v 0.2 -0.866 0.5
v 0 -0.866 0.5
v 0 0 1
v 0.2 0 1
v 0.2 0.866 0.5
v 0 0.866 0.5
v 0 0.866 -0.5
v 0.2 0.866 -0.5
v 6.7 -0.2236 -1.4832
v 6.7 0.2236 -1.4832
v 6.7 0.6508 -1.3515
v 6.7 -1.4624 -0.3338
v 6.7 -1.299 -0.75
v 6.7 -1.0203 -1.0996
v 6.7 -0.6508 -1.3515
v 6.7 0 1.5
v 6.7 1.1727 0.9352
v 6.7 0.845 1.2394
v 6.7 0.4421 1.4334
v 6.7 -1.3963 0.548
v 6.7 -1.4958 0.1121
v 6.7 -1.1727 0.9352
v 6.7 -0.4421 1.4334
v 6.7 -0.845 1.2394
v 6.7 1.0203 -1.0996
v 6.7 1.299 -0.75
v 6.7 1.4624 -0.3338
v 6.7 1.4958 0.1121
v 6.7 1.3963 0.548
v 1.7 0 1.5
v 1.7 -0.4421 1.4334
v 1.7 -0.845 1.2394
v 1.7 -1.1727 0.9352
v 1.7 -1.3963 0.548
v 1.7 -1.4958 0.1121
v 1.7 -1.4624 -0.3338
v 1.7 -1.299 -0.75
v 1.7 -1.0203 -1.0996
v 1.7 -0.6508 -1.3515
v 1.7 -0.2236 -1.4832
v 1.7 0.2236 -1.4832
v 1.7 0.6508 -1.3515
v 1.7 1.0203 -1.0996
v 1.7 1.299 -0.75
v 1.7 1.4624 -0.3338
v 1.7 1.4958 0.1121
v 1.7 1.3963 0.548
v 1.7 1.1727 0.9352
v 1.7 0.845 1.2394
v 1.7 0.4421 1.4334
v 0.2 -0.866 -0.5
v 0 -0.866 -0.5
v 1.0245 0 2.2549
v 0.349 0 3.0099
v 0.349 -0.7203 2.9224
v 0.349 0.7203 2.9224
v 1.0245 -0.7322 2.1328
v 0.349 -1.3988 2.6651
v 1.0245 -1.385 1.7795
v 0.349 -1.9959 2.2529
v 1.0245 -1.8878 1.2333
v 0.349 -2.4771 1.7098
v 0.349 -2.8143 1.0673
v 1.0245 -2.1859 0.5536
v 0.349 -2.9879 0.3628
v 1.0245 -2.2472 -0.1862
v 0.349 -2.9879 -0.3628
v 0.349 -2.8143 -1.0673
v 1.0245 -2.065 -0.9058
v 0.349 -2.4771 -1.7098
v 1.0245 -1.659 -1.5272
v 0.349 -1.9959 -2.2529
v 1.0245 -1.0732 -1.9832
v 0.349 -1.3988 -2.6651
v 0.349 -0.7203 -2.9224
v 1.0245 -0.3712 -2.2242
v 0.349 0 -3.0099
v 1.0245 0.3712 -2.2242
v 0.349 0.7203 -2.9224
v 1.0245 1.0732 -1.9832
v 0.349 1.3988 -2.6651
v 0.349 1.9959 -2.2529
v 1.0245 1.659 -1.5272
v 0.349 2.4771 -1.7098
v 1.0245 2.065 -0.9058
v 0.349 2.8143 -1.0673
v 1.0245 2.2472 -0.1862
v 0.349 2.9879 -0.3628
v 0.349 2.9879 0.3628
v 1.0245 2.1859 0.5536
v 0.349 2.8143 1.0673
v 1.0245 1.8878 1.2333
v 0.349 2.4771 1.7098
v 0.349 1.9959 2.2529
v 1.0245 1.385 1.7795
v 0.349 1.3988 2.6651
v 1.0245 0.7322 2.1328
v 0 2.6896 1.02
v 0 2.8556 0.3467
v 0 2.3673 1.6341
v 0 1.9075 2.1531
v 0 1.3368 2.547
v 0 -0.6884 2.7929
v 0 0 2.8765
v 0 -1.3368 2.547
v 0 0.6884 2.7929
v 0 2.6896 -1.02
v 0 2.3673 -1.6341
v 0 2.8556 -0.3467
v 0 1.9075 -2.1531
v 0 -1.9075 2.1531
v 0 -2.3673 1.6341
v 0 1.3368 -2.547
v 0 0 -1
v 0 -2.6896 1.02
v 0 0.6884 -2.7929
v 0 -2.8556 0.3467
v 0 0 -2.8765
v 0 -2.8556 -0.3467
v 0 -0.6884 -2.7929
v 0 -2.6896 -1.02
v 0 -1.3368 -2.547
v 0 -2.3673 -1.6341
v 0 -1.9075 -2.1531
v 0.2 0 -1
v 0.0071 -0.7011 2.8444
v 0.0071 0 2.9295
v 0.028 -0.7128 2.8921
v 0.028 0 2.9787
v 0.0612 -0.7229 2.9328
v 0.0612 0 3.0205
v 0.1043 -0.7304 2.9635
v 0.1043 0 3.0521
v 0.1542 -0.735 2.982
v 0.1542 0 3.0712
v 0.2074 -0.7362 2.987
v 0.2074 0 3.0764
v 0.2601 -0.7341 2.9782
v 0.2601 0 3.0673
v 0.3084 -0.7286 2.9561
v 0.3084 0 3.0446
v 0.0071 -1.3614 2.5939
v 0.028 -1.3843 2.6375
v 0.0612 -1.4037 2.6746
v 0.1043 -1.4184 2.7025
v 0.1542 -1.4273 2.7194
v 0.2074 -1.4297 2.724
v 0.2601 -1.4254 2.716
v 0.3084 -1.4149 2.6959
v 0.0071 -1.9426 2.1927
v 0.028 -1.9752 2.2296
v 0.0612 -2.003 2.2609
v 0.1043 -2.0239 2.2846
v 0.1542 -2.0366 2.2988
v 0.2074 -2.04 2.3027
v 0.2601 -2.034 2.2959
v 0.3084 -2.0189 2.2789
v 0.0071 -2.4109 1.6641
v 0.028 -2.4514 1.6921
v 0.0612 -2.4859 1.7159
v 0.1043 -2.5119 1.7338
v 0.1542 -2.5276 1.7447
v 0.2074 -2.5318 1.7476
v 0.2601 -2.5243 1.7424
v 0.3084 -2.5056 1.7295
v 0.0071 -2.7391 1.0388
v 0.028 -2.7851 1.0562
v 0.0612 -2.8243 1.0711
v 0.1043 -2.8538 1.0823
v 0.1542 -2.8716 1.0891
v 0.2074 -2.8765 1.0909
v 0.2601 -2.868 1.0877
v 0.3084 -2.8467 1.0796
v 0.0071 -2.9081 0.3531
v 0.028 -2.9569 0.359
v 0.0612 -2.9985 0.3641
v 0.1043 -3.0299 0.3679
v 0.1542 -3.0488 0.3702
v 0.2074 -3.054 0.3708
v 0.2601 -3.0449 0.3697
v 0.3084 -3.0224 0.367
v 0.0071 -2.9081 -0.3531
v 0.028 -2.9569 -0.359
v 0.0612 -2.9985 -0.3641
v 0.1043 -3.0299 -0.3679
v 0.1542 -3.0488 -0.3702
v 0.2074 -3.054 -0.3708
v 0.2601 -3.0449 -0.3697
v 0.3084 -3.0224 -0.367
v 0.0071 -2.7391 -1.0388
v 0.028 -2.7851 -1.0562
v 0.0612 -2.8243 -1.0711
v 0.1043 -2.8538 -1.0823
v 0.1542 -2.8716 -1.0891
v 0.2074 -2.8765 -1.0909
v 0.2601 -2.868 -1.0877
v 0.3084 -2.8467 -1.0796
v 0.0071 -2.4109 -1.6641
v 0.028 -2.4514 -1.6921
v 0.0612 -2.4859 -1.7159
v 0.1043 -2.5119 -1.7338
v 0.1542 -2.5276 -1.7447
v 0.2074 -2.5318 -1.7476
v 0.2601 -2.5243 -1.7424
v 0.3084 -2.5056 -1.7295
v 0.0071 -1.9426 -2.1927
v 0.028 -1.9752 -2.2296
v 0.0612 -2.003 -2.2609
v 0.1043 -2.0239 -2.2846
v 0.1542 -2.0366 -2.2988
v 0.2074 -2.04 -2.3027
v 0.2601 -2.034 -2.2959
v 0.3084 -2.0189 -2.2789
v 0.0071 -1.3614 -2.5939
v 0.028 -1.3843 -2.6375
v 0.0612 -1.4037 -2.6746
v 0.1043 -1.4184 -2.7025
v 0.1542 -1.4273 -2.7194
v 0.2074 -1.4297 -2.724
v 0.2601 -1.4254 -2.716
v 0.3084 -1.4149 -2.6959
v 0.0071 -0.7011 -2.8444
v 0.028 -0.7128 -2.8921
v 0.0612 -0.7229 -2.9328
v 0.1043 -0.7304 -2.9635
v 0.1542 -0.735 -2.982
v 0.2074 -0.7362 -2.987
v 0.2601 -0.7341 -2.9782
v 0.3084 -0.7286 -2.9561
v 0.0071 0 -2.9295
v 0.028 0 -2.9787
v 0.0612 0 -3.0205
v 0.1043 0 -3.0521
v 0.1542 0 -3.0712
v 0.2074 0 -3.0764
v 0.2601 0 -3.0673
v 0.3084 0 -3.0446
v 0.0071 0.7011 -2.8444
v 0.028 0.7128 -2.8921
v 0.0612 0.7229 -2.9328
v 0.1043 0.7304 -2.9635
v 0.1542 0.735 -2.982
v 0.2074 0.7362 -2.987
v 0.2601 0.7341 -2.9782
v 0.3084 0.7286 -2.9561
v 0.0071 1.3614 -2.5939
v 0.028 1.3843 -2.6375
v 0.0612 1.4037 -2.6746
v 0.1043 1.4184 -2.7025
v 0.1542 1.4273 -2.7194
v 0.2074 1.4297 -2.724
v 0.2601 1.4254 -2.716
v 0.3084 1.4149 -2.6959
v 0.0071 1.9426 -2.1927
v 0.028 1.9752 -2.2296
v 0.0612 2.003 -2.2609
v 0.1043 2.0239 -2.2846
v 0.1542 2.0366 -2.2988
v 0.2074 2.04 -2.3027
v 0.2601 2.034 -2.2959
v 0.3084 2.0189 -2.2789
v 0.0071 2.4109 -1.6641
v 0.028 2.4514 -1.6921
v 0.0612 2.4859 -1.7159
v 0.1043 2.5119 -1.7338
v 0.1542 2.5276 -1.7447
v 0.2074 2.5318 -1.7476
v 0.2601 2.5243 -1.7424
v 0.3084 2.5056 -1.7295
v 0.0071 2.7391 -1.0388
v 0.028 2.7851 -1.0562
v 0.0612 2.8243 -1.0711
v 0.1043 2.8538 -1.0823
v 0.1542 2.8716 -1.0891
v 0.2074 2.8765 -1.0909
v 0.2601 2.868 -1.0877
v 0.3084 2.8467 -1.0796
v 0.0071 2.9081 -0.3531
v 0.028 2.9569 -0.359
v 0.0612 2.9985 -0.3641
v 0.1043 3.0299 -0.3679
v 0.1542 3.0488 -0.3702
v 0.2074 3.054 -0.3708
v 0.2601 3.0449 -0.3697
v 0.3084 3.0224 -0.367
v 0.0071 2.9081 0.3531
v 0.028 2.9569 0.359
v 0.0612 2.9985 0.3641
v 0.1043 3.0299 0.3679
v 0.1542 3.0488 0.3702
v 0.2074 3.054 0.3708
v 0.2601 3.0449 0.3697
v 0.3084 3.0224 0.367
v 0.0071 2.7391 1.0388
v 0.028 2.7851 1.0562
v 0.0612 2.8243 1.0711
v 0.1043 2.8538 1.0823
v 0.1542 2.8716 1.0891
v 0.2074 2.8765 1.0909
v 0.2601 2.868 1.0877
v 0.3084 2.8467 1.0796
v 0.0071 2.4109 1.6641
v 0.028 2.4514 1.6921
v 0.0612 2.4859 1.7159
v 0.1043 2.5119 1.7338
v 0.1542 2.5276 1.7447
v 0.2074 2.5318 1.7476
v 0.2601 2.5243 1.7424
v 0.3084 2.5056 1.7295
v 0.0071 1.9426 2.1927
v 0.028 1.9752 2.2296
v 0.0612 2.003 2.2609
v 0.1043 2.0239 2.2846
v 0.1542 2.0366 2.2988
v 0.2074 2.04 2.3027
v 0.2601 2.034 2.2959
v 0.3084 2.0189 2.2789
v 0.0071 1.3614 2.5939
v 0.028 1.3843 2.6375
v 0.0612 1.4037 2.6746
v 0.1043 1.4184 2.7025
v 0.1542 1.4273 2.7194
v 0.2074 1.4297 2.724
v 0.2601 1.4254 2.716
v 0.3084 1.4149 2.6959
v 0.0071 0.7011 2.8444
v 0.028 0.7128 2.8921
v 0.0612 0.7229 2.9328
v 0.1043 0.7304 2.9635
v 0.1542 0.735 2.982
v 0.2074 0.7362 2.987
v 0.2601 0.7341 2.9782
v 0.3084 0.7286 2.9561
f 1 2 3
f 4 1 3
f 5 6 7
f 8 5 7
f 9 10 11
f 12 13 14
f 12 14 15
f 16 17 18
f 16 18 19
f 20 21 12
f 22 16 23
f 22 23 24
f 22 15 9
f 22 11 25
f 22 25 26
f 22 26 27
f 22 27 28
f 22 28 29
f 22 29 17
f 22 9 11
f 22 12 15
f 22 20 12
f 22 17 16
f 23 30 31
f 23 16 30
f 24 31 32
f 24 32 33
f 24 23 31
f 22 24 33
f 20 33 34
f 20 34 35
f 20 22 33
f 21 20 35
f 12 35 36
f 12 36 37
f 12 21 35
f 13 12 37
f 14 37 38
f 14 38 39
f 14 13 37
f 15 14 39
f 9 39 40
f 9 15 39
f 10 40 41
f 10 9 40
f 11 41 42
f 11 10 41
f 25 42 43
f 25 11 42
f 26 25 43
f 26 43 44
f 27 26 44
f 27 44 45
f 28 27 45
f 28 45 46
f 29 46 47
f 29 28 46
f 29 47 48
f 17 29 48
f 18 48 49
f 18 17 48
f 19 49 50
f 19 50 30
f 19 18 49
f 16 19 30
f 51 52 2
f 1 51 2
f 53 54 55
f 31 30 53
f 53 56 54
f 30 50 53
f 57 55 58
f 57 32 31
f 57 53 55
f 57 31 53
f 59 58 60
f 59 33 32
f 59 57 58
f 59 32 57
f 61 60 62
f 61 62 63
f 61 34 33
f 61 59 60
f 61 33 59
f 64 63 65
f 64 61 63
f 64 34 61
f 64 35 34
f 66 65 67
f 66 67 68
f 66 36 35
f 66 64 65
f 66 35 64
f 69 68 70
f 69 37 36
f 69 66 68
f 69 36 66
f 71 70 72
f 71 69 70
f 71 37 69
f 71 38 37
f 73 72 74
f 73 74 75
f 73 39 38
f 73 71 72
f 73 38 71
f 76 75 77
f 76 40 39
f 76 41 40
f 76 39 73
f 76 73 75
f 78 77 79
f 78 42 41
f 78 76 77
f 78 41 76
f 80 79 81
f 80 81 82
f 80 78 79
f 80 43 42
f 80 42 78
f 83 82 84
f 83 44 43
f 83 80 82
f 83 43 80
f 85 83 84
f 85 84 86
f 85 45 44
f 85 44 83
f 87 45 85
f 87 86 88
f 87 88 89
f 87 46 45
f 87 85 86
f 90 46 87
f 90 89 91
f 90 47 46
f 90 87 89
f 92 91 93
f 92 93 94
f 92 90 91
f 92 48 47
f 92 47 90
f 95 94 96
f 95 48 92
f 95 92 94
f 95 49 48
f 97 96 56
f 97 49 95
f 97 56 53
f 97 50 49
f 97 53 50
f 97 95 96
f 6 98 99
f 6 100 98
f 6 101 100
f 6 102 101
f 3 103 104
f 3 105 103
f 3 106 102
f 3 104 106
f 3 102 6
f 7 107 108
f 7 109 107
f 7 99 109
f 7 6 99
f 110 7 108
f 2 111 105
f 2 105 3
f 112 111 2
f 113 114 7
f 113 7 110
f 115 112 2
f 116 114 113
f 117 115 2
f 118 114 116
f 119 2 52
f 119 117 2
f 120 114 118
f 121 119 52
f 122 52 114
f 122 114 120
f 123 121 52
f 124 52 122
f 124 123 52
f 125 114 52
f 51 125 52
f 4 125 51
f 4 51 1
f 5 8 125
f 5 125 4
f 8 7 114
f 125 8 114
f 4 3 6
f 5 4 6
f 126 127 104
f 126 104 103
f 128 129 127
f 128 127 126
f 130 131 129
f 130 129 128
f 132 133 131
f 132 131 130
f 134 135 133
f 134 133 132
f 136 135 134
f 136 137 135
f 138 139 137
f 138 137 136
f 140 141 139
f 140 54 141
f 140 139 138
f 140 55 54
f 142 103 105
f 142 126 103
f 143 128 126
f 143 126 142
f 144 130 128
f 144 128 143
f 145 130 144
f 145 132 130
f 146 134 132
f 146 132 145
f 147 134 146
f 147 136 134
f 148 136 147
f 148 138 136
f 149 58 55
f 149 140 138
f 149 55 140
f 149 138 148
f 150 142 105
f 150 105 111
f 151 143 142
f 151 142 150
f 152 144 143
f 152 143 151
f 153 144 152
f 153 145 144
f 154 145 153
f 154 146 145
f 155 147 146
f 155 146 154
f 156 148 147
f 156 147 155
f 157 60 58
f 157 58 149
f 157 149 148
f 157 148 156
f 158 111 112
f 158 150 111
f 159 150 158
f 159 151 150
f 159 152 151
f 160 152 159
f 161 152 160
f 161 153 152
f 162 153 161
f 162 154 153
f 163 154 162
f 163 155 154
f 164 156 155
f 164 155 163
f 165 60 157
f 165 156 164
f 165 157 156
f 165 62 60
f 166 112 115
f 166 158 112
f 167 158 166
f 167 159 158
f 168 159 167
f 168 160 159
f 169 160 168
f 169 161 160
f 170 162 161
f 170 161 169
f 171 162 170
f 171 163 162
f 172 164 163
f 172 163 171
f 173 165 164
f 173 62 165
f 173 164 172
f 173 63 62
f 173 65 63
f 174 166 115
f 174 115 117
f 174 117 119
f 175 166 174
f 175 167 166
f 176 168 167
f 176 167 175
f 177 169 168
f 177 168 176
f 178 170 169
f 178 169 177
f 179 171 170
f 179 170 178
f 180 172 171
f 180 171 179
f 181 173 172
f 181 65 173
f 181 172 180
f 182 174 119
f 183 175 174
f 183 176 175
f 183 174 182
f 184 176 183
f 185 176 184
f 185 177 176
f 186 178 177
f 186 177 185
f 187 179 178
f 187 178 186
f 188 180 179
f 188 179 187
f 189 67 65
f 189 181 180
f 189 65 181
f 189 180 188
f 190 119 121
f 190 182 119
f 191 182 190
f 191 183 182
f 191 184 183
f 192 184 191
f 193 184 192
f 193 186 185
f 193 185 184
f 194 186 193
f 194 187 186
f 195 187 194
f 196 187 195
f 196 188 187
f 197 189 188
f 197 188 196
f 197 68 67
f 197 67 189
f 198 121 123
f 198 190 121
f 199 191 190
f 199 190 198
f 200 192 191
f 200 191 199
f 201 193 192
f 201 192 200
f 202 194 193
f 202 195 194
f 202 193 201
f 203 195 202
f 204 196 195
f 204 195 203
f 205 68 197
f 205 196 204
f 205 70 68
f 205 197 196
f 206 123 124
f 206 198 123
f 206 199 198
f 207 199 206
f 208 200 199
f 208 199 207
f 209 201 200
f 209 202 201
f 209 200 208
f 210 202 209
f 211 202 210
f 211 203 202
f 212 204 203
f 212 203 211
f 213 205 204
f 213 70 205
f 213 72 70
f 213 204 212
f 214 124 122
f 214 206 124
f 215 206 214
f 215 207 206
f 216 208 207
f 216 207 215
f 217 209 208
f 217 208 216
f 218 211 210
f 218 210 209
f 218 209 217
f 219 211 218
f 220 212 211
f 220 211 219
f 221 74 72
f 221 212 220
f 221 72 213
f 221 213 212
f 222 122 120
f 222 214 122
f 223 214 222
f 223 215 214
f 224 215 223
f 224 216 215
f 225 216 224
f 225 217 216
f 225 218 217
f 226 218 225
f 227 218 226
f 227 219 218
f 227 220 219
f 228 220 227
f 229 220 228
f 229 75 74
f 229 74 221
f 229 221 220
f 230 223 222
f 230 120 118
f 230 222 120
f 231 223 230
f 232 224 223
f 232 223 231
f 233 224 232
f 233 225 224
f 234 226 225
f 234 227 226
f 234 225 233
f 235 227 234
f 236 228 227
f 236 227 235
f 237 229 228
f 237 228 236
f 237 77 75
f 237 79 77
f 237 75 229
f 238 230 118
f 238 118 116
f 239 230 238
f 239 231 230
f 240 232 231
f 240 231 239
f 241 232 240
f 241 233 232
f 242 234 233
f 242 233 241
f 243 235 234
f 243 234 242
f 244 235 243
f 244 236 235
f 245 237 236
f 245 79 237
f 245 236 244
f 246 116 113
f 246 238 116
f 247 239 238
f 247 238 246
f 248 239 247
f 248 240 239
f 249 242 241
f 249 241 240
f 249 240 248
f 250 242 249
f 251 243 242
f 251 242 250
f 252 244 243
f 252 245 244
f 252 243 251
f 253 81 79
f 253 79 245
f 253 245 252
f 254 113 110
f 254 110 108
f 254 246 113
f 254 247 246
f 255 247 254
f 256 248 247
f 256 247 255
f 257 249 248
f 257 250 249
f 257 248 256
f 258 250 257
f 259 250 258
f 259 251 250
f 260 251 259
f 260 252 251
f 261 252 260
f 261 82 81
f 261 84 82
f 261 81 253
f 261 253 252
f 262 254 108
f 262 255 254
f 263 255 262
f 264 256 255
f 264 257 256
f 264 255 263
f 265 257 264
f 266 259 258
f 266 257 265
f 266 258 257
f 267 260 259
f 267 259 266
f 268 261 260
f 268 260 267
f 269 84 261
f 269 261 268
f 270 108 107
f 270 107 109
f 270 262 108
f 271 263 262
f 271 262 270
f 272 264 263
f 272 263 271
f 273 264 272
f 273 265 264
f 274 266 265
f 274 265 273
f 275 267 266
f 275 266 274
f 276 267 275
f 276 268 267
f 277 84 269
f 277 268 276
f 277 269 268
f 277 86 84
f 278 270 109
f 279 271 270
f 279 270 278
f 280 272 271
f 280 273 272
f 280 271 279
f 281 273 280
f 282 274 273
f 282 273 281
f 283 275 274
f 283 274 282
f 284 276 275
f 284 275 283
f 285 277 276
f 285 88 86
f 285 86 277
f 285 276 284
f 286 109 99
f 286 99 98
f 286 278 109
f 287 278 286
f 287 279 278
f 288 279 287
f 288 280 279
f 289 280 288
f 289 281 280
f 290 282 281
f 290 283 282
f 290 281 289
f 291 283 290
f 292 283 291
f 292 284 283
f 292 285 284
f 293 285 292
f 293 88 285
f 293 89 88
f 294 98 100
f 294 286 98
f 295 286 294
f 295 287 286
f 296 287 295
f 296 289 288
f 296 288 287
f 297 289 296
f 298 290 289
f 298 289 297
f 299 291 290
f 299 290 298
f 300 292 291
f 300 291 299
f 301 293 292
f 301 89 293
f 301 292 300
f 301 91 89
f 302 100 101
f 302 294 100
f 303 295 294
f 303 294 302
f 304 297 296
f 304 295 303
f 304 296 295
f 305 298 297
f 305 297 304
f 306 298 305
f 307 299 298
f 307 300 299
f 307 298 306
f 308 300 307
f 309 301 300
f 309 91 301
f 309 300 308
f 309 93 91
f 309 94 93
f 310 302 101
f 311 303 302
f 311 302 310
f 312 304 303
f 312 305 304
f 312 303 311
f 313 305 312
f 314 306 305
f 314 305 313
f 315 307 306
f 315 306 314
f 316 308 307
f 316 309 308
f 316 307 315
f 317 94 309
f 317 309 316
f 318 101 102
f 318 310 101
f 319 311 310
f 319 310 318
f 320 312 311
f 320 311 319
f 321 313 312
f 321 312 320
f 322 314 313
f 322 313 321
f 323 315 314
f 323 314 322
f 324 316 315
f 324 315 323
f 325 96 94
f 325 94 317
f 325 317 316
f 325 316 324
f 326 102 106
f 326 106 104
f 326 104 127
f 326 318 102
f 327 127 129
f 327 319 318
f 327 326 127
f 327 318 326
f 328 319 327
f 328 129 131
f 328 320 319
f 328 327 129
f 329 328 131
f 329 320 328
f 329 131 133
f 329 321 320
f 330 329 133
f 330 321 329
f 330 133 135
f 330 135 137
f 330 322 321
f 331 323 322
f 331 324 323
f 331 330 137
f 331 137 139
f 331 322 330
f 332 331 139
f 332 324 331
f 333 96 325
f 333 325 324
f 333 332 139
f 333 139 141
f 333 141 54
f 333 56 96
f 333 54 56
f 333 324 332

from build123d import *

# Parameters (mm, degrees)
CONG_1_R                = 0.2
ENL_V_MAT_EXTRU_1_DEPTH = 0.2


with BuildPart() as part:
    # Esquisse1 → Révolution1 (revolve)
    with BuildSketch(Plane.XY, mode=Mode.PRIVATE) as r_volution1_sk:
        Polygon((0, 0), (0, 3.4), (1.7, 1.5), (6.7, 1.5), (6.7, 0), align=None)
    revolve(r_volution1_sk.sketch.rotate(Axis((0, 0, 0), (1, 0, 0)), 90), axis=Axis((0, 0, 0), (1, 0, 0)))

    # Congé1
    cong_1_edges = [part.edges().sort_by_distance(p)[0] for p in [
        (0, 0, -3.4),
    ]]
    fillet(cong_1_edges, radius=CONG_1_R)

    # Esquisse2 → Enlèv. mat.-Extru.1 (cut)
    with BuildSketch(Plane.ZY):
        Polygon((0.5, -0.866025404), (1, 0), (0.5, 0.866025404), (-0.5, 0.866025404), (-1, 0), (-0.5, -0.866025404), align=None)
    extrude(amount=-ENL_V_MAT_EXTRU_1_DEPTH, mode=Mode.SUBTRACT)


solid = part.part
